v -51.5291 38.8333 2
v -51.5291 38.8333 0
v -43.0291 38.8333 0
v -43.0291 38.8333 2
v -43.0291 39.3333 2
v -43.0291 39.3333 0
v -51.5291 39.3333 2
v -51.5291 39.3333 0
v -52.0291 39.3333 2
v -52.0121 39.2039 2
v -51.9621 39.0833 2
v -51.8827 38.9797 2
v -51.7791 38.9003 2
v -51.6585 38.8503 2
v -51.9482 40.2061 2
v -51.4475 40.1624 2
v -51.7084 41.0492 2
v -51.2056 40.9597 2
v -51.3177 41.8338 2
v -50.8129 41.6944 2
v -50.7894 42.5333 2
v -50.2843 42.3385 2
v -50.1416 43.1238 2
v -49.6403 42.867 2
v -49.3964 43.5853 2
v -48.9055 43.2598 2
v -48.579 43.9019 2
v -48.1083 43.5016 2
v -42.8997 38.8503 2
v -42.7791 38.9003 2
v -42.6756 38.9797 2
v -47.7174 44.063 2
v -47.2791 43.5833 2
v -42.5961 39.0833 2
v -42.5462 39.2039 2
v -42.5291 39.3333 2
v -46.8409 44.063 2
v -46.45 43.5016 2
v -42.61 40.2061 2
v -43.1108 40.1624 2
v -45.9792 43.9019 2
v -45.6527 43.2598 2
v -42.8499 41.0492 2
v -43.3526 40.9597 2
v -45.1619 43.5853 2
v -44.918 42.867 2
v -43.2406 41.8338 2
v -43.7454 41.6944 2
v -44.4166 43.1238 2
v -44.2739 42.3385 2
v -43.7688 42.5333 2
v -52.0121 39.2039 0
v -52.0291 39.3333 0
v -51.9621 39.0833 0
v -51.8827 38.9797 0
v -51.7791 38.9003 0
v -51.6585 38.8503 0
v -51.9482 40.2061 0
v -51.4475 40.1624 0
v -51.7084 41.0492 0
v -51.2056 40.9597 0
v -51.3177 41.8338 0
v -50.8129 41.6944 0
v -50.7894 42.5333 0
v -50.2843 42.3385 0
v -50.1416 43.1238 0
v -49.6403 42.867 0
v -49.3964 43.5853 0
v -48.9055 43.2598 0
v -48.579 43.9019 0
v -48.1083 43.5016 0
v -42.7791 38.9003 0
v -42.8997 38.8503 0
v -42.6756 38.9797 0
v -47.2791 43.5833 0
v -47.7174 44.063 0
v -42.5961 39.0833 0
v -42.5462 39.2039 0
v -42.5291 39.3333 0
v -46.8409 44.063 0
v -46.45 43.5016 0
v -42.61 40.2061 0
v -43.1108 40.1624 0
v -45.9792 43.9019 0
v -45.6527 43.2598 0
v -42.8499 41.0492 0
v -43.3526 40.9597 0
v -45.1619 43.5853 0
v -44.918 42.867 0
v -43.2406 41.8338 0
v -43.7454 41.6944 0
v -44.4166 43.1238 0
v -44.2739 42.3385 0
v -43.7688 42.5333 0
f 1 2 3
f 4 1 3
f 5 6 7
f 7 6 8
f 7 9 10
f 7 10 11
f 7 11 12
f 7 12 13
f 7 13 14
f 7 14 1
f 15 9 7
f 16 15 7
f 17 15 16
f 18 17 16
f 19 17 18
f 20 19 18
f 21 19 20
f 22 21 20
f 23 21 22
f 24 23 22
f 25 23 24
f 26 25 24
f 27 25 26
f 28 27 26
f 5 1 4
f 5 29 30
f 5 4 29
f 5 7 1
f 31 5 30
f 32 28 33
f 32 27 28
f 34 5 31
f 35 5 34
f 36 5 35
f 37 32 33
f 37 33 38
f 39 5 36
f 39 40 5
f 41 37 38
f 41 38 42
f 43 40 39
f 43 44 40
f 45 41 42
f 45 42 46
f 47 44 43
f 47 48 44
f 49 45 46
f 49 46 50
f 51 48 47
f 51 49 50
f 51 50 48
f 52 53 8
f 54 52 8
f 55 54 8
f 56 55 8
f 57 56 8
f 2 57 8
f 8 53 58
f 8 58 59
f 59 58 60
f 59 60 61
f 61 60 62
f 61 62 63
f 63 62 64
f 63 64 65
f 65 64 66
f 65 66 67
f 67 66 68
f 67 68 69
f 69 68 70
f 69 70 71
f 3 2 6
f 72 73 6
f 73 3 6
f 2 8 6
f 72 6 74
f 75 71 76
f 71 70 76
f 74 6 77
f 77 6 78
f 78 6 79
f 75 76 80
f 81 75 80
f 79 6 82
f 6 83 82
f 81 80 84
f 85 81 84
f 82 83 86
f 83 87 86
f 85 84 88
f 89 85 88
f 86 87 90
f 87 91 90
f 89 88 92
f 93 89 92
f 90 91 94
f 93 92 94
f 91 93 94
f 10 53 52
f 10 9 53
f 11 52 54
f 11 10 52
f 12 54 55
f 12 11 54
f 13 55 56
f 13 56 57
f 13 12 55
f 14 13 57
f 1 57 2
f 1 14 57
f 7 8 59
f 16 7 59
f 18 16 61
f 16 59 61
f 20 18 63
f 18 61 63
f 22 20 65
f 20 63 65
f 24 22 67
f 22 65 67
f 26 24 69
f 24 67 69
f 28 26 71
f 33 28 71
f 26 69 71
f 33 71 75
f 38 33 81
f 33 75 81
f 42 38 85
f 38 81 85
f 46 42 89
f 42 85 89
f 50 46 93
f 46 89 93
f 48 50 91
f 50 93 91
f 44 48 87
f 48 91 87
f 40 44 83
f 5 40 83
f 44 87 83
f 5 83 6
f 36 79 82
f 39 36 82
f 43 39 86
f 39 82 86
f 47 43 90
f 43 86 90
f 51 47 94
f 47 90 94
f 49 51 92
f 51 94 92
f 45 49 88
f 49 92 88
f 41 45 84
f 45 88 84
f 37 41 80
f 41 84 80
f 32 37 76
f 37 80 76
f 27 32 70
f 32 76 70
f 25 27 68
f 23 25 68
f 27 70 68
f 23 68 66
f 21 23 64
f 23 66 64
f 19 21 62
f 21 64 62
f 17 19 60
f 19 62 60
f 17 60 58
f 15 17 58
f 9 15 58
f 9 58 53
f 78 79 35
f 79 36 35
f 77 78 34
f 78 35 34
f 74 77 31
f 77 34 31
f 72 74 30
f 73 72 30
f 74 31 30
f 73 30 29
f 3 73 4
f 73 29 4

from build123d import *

# Parameters (mm, degrees)
F1_DEPTH = 2
F2_R     = 0.5


with BuildPart() as f1:
    # F0 (on Top) → F1 (new body)
    with BuildSketch(Plane.XY):
        with BuildLine():
            ThreePointArc((-42.5555160352, 38.8332652748), (-47.2791269422, 44.0832652748), (-52.0027378491, 38.8332652748))
            Line((-52.0027378491, 38.8332652748), (-42.5555160352, 38.8332652748))
        make_face()
        with BuildLine():
            ThreePointArc((-51.5291269422, 39.3332652748), (-47.2791269422, 43.5832652748), (-43.0291269422, 39.3332652748))
            Line((-43.0291269422, 39.3332652748), (-51.5291269422, 39.3332652748))
        make_face(mode=Mode.SUBTRACT)
    extrude(amount=F1_DEPTH)

    # F2
    f2_edges = [f1.edges().sort_by_distance(p)[0] for p in [
        (-52.002738, 38.833265, 1),
        (-42.555516, 38.833265, 1),
    ]]
    fillet(f2_edges, radius=F2_R)


solid = f1.part
